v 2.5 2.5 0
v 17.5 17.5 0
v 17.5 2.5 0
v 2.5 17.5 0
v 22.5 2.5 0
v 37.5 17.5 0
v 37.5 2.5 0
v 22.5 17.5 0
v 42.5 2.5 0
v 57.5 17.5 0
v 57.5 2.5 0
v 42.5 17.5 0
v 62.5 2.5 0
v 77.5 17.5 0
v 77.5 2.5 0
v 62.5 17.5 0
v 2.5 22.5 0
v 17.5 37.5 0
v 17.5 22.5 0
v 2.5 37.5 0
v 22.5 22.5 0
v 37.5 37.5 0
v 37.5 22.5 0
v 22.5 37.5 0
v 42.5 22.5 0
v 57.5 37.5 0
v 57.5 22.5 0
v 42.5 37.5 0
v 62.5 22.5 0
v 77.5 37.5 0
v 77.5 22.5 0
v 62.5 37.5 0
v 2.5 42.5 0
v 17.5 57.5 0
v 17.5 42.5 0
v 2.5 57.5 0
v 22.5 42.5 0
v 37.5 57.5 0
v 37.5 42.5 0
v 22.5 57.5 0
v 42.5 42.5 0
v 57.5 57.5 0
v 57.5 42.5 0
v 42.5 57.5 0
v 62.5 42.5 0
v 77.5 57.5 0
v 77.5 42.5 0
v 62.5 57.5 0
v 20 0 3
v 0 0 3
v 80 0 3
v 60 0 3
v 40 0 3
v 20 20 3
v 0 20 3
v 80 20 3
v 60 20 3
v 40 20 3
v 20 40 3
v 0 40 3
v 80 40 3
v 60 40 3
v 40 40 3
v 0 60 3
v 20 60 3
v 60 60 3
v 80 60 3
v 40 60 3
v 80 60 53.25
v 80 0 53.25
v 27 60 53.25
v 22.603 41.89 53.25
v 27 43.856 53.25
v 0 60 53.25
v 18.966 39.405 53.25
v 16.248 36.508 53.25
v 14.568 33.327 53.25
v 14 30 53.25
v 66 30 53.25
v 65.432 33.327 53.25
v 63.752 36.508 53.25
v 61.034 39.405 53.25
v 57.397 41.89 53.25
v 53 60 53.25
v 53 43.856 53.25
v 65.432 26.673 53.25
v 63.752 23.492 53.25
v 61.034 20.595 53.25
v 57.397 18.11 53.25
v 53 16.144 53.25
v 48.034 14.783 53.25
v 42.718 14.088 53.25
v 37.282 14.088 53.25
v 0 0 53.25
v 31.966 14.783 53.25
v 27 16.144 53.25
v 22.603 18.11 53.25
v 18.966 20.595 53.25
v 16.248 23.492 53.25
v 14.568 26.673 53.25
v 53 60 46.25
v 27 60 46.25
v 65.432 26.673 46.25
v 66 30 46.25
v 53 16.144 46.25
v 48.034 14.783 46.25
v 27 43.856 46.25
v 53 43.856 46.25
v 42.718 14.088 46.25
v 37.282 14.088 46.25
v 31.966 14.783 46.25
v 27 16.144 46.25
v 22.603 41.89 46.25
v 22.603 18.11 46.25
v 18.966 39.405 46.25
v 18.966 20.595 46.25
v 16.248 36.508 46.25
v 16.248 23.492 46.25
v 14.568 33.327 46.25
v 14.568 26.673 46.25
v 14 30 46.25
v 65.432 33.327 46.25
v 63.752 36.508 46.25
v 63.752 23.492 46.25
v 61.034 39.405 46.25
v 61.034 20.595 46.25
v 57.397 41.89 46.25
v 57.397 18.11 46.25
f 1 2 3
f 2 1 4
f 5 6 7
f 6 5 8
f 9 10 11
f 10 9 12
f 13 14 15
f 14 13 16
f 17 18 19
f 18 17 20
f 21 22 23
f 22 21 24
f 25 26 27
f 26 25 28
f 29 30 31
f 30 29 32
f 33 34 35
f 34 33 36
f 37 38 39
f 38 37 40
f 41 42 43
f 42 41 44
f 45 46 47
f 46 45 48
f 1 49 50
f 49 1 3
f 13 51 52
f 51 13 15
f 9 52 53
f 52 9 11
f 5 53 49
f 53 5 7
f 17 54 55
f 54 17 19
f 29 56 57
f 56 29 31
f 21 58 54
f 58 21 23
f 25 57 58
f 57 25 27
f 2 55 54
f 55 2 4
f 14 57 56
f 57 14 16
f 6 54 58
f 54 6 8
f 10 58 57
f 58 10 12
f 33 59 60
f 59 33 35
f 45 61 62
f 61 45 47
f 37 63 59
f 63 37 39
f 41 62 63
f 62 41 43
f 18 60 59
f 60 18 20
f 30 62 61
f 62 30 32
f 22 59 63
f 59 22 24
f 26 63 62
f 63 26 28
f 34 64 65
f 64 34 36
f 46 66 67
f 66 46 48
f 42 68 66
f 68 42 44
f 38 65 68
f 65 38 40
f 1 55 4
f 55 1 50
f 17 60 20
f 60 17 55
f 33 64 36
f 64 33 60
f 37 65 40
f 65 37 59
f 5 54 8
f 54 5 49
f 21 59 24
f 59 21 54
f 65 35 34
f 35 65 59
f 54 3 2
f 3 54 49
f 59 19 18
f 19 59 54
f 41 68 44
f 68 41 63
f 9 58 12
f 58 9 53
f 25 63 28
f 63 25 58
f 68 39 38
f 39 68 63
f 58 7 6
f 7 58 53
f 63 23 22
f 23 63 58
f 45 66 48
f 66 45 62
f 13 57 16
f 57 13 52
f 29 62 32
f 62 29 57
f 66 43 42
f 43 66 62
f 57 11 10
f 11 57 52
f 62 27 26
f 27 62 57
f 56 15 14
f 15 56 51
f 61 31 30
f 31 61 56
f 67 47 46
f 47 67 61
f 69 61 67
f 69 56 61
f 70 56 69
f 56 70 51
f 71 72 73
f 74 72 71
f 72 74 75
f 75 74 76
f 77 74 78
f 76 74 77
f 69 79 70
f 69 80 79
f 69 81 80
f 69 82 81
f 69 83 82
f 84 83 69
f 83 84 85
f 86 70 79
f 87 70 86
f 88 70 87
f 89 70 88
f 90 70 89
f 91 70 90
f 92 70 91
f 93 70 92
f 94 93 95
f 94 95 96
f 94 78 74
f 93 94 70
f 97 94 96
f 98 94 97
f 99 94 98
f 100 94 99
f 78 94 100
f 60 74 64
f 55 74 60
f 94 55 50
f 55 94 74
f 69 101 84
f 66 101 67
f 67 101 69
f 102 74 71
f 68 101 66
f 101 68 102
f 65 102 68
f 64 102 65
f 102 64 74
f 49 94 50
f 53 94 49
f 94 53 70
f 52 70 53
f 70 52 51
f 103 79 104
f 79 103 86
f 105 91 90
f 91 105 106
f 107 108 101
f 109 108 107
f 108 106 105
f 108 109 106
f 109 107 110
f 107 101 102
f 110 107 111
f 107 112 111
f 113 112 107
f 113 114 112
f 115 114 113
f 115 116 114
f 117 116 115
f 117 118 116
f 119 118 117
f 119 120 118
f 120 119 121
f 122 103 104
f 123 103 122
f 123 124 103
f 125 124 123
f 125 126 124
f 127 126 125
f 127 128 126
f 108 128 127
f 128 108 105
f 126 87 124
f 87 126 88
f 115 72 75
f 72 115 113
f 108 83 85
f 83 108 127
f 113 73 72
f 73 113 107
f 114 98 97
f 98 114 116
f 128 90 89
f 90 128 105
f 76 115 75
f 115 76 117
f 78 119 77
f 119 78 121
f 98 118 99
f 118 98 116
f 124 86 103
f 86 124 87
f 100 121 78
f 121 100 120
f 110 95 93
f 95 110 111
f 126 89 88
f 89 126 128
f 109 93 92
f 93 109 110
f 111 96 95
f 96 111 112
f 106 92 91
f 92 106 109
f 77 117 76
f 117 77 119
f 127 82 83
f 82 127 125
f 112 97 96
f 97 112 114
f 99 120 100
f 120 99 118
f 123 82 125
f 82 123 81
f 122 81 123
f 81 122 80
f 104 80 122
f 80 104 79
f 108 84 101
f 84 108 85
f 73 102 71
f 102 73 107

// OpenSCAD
// file: ../common.scad
BASE_TILE_SIZE=20;
BASE_WIDTH=5;
PEAK_HEIGHT=3;

function y_up() = [90, 0, 0];
function x_up() = [90, 0, 90];

function min_floor_offset(wall_width) = wall_width + PEAK_HEIGHT;
function tri_mid() = BASE_WIDTH / 2;
function triangle() = [[0, 0],[BASE_WIDTH, 0],[tri_mid(), PEAK_HEIGHT]];
function base_tile_size() = BASE_TILE_SIZE;
function peak_height() = PEAK_HEIGHT;

function isX(direction) = (direction == "x");

module grid(width, depth, direction) {
    length = isX(direction) ? width : depth;
    slot_length = isX(direction) ? depth : width;
    translate_z = isX(direction) ? -slot_length : 0;
    rot = isX(direction) ? y_up() : x_up();

    // This is the total additional slots past the initial one
    total_slots = floor(length / BASE_TILE_SIZE);

    for (i = [0 : total_slots]) {
        offset = -tri_mid() + BASE_TILE_SIZE * i;
        rotate(rot)
        translate([offset, 0, translate_z])
        linear_extrude(height = slot_length)
        polygon(points=triangle());
    }
}

module grid_slots(width, depth) {
    grid(width, depth, "y");
    grid(width, depth, "x");
}

module base_block(width, depth, height) {
    difference() {
        cube([width, depth, height]);
        grid_slots(width, depth);
    }
}
// file: common.scad
WALL_WIDTH = 3;
BOX_HEIGHT = 69;
BOX_CLEARENCE = 15.75;
TILE_HEIGHT = 1.75;

function wall_width() = WALL_WIDTH;
function box_height() = BOX_HEIGHT;
function box_clearence() = BOX_CLEARENCE;
function tile_height() = TILE_HEIGHT;
// main file
use <common.scad>
use <../common.scad>

PLAYER_TOKEN_LENGTH = 52;
PLAYER_TOKEN_WIDTH = 32;
PLAYER_TOKEN_COUNT = 4;

total_width = base_tile_size() * 4;
total_depth = base_tile_size() * 3;
total_height = box_height() - box_clearence();

module ellipse(width, height) {
  scale([1, height / width, 1]) circle(r = width / 2);
}

module player_holder() {
    x_offset = total_width / 2;
    y_offset = total_depth / 2;
    hole_height = PLAYER_TOKEN_COUNT * tile_height();
    translate([x_offset, y_offset, total_height - hole_height])
    union() {
        linear_extrude(hole_height)
        ellipse(PLAYER_TOKEN_LENGTH, PLAYER_TOKEN_WIDTH);
        translate([-PLAYER_TOKEN_LENGTH / 4, 0, 0])
        cube([PLAYER_TOKEN_LENGTH / 2, total_depth / 2, hole_height]);
    }
}

difference() {
    base_block(total_width, total_depth, total_height);
    player_holder();
}
